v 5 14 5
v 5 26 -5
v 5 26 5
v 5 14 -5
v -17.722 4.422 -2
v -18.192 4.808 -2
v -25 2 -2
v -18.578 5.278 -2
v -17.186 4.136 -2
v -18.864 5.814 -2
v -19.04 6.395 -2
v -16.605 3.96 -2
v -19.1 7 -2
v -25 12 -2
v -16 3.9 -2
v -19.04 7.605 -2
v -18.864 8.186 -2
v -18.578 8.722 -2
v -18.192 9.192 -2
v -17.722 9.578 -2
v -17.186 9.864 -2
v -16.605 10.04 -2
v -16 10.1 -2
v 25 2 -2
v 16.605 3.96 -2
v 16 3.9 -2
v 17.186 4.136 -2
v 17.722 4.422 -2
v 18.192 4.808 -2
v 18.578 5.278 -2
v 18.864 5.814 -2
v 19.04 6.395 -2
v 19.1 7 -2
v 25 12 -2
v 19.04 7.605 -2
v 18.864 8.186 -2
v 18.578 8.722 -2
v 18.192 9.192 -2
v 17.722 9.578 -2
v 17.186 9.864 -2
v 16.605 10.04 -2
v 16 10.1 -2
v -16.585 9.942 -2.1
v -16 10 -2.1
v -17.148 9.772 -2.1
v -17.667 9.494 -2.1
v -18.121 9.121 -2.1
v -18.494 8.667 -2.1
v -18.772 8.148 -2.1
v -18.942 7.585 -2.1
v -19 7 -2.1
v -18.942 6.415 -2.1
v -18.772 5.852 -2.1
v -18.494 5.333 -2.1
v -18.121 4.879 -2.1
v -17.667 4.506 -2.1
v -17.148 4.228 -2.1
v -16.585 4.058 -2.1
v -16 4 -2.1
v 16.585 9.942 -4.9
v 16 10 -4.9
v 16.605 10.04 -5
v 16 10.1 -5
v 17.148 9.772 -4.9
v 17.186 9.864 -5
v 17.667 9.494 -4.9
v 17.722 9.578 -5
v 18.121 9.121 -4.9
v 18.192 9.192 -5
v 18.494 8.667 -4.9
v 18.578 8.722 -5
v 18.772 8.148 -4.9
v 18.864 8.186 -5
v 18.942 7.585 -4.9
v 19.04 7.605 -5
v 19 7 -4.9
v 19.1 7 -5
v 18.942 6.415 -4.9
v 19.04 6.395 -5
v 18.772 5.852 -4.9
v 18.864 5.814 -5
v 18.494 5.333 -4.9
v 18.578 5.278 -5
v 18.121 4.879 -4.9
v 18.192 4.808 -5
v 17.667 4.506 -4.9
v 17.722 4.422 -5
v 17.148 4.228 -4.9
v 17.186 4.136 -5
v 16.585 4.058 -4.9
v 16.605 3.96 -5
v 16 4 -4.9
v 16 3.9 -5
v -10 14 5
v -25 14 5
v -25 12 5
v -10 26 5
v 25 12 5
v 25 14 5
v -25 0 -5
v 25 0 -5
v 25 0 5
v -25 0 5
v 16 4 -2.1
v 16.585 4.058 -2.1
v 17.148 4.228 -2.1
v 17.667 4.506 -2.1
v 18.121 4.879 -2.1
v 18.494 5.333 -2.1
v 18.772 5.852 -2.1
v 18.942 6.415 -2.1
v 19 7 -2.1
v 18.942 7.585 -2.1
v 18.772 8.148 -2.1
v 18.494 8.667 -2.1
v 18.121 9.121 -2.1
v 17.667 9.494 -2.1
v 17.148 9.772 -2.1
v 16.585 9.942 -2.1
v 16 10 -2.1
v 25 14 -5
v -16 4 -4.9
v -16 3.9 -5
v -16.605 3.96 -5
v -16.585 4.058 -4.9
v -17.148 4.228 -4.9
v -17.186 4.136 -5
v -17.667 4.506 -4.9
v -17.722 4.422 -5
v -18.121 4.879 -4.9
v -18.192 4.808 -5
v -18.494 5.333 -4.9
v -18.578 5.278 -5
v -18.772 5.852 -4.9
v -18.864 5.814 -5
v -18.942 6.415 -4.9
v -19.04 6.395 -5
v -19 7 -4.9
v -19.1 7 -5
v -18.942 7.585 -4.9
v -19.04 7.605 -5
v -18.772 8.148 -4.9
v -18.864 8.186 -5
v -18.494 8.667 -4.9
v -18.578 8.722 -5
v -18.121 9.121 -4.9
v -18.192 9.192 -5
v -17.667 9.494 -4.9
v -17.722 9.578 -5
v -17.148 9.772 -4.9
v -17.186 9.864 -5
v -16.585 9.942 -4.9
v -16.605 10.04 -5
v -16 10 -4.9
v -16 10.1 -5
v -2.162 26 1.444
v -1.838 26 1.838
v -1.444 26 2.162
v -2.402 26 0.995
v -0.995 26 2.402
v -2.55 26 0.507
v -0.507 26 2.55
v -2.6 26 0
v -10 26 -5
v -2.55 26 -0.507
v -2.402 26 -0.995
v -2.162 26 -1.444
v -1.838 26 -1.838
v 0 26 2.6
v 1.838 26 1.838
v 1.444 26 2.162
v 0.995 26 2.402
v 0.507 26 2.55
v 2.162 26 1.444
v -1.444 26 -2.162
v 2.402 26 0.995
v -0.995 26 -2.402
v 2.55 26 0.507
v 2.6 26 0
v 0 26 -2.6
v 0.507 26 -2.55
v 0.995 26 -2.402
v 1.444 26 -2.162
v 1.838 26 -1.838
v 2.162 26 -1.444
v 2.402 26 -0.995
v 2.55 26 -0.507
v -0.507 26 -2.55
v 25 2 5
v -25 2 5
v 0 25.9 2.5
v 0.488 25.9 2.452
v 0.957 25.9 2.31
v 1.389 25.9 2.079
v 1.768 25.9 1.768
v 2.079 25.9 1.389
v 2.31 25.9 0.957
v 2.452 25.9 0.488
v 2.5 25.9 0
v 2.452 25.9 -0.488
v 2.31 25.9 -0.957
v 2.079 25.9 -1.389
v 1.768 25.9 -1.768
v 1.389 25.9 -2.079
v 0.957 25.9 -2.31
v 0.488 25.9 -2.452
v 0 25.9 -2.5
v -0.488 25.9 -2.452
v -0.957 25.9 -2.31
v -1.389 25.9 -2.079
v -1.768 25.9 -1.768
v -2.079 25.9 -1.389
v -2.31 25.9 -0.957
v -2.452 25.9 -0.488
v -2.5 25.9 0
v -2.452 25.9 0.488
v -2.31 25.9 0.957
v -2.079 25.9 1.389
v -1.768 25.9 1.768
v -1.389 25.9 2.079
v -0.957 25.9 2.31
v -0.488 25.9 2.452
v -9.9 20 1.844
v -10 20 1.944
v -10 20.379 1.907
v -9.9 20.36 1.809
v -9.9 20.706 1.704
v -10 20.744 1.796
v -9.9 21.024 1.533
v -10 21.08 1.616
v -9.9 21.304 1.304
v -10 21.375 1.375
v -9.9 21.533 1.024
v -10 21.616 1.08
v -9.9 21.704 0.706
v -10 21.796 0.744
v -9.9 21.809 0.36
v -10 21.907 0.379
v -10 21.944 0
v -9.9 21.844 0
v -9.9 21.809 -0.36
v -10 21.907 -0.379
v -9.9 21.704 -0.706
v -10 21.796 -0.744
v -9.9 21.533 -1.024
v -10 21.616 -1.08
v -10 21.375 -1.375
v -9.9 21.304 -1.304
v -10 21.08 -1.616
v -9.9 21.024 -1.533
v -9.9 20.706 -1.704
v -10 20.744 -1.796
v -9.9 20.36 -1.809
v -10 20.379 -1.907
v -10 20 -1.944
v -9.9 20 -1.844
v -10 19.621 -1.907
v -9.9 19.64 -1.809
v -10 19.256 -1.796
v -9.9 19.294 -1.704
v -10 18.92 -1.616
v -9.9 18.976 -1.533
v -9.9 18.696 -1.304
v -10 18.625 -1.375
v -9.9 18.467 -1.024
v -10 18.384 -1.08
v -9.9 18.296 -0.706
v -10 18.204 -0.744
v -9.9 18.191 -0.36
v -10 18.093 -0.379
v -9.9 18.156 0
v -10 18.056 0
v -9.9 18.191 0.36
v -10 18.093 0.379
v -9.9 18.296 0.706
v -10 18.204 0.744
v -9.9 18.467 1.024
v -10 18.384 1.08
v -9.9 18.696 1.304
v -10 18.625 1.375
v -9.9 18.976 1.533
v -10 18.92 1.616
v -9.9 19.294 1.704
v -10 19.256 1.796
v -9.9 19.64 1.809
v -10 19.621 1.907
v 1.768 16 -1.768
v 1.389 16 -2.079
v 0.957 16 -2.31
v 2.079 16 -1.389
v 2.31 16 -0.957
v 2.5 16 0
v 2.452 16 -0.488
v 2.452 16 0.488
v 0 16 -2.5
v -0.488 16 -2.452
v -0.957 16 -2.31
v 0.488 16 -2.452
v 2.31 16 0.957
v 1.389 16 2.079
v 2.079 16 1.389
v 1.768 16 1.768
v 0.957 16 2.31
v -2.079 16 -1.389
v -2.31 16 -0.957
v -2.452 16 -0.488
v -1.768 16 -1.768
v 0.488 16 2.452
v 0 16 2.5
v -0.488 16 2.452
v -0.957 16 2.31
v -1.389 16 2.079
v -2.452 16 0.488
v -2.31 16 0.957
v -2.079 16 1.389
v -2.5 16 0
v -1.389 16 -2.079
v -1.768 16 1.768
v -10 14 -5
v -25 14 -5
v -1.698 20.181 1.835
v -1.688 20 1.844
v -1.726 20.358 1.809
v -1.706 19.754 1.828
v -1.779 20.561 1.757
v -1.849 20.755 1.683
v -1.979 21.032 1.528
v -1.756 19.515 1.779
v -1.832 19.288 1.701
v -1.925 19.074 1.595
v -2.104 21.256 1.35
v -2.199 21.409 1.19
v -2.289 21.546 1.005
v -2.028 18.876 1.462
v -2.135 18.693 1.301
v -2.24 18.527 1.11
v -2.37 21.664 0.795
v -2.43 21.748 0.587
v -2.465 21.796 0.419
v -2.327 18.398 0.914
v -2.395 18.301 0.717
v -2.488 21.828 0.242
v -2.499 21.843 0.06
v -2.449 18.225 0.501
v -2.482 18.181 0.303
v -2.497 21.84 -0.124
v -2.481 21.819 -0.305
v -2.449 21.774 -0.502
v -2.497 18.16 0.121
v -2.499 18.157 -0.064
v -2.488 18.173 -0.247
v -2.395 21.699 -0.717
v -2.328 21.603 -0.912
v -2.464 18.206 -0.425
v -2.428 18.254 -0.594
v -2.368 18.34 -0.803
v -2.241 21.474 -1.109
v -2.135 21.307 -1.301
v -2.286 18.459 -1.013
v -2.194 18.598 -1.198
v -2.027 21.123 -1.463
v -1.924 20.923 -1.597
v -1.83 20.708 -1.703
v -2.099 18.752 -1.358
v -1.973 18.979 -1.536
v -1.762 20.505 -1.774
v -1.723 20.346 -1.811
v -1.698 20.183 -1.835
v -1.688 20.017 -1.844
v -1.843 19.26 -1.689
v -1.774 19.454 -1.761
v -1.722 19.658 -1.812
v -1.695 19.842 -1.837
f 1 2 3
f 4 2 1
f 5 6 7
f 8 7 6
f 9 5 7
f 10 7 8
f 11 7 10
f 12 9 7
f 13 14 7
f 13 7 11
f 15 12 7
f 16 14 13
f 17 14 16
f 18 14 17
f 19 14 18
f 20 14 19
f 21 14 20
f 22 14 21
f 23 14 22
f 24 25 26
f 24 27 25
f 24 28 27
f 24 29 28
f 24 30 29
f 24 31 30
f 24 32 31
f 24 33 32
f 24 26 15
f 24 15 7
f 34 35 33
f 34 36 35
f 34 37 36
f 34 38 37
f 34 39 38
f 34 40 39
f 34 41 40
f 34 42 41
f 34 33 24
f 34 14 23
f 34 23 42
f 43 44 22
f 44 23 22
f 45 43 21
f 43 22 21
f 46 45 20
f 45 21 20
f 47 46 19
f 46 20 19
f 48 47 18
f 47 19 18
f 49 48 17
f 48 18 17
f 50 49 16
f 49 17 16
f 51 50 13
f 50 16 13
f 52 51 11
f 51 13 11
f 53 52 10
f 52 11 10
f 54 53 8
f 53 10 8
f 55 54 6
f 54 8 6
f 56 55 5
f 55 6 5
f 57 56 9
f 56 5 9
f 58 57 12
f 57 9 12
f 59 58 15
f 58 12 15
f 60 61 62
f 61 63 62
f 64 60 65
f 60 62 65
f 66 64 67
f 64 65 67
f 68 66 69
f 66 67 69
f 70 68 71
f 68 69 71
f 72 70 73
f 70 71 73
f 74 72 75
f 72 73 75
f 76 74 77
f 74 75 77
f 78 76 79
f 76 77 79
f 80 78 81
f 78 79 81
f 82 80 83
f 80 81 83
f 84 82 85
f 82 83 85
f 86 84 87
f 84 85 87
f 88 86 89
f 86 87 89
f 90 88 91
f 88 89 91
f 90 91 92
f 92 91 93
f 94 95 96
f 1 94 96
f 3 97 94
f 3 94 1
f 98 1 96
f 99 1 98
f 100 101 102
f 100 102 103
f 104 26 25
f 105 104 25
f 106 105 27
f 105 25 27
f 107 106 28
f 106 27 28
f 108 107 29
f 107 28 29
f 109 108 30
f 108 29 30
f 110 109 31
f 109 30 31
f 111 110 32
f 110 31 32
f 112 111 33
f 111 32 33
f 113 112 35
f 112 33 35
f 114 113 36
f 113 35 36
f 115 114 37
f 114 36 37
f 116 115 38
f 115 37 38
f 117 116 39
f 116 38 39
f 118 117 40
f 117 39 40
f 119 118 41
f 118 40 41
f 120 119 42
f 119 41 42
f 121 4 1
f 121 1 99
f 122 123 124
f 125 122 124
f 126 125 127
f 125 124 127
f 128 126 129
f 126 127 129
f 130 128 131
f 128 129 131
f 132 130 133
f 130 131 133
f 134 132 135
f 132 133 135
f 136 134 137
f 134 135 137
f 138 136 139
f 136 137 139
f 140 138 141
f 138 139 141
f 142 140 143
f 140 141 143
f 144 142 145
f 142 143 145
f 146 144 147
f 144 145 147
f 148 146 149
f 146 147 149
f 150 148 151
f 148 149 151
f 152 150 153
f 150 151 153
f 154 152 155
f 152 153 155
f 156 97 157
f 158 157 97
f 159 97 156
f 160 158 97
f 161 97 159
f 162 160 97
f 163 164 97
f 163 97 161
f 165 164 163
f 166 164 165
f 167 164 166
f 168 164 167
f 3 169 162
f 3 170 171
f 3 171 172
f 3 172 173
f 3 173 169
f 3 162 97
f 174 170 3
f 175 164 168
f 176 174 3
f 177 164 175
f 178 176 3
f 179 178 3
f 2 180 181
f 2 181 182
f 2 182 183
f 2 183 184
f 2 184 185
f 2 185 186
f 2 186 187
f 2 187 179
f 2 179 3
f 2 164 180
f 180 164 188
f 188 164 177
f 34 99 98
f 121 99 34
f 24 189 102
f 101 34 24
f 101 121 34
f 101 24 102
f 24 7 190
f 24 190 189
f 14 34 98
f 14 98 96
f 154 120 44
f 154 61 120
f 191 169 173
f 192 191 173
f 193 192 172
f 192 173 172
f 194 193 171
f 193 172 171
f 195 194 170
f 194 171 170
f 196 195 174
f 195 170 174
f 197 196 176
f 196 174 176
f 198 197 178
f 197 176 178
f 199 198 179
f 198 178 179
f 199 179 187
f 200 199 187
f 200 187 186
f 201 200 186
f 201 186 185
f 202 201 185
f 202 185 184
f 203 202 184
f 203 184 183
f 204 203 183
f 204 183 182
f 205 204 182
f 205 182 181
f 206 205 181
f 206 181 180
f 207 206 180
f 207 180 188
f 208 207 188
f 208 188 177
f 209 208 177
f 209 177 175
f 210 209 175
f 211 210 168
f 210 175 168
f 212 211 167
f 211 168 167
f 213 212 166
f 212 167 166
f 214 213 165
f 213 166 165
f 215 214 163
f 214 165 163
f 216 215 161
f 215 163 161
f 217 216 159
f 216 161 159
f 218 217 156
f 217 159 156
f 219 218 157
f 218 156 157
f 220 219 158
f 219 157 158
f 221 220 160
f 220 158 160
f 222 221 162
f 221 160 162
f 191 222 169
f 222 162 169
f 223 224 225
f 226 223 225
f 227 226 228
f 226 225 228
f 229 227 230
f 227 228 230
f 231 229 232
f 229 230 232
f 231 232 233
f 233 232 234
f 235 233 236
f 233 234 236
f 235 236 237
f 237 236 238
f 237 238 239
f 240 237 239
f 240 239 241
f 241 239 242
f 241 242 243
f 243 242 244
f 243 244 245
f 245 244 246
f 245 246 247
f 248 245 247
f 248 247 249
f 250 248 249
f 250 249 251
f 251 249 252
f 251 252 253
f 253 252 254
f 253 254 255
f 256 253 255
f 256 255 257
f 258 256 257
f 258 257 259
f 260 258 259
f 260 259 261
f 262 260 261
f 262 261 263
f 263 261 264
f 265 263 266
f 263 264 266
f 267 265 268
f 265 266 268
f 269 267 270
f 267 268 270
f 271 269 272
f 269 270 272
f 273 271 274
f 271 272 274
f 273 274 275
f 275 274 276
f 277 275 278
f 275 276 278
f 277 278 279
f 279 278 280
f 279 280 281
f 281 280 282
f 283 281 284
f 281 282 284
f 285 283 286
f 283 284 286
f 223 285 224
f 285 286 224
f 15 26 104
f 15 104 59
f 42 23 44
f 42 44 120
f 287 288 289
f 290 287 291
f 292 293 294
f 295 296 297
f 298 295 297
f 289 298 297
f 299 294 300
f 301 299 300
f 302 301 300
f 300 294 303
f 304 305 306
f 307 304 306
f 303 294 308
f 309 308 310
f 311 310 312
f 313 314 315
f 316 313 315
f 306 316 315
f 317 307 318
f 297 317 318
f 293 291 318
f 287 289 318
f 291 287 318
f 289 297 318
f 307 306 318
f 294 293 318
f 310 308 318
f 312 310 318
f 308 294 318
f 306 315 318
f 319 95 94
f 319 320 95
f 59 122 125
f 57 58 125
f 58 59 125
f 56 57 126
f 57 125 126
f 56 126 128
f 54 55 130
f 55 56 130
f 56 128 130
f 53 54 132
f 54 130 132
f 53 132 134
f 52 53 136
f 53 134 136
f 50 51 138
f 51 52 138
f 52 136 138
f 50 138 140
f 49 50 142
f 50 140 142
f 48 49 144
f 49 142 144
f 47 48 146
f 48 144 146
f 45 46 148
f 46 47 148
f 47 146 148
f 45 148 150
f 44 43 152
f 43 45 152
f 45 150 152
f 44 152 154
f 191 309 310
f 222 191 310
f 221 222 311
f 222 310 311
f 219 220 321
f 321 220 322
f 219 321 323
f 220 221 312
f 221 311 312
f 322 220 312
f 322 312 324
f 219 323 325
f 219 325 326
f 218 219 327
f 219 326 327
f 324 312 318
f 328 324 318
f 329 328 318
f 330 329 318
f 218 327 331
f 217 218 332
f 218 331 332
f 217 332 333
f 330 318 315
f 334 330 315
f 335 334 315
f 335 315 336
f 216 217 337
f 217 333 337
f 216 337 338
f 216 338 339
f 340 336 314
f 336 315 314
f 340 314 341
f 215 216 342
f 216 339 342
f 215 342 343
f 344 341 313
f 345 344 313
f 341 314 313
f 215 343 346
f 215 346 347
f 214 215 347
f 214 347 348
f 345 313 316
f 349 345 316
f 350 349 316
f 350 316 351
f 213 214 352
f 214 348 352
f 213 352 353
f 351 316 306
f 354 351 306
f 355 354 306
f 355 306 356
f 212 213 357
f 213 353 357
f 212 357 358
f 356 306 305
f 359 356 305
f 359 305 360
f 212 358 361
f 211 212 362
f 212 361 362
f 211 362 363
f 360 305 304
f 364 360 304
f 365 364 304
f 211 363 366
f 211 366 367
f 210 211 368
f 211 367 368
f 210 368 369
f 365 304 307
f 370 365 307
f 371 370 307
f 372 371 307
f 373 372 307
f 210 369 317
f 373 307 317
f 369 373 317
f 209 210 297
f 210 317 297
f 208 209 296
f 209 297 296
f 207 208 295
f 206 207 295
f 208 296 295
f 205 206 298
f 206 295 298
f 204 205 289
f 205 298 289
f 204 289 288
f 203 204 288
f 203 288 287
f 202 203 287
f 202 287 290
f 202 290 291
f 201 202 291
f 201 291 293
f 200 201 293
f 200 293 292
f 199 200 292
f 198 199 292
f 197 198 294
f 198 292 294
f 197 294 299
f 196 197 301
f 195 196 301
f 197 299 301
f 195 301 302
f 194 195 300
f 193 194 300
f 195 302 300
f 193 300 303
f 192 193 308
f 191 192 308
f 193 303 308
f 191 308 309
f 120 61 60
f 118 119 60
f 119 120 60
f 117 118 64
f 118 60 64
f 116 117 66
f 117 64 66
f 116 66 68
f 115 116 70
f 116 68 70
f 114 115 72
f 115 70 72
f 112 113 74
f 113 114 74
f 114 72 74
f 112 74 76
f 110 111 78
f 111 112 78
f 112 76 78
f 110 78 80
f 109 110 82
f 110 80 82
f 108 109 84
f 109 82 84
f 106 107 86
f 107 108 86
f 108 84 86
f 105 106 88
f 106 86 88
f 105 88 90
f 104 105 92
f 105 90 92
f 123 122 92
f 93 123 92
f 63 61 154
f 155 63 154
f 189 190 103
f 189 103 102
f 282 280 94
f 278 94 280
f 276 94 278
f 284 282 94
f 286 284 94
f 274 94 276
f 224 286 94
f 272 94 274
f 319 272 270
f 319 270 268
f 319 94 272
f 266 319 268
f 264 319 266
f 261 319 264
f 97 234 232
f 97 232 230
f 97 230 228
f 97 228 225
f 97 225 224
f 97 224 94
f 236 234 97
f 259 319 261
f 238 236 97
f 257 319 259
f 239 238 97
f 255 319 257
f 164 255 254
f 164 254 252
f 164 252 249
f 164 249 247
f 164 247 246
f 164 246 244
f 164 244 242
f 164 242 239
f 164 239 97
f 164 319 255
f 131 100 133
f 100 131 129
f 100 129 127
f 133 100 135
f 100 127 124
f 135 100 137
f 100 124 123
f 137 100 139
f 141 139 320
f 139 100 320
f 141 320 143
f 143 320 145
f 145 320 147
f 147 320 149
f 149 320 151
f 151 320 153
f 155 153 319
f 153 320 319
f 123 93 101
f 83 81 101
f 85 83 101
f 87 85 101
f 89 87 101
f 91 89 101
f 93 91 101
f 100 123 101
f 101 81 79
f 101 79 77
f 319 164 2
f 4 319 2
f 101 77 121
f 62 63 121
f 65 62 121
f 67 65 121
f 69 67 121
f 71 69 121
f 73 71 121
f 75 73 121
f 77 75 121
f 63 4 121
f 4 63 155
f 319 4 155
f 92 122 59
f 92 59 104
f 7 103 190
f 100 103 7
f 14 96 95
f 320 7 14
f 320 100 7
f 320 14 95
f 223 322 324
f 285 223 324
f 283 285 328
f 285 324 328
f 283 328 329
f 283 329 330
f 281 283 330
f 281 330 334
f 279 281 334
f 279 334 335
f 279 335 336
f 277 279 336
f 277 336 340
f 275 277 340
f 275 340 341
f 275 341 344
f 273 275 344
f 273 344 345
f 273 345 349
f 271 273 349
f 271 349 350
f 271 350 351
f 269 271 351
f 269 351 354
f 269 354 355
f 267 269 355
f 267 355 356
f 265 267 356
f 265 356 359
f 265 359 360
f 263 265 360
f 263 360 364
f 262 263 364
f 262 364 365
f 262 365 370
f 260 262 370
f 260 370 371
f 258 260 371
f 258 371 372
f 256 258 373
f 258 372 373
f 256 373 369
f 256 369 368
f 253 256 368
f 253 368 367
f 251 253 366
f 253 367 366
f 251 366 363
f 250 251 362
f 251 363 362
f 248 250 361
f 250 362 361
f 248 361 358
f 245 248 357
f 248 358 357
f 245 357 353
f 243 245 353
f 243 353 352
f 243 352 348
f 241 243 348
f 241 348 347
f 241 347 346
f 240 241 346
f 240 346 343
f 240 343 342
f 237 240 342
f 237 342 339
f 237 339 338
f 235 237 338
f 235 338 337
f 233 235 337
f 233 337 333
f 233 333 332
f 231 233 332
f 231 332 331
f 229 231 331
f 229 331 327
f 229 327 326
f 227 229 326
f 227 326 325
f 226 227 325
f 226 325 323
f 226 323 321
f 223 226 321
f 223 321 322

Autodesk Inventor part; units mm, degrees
ref_plane "YZ Plane" through (0, 0, 0) normal (1, 0, 0) x (0, 1, 0)
ref_plane "XZ Plane" through (0, 0, 0) normal (0, 1, 0) x (-1, 0, 0)
ref_plane "XY Plane" through (0, 0, 0) normal (0, 0, 1) x (1, 0, 0)
sketch "Sketch1" plane through (0, 0, 0) normal (0, 0, 1) x (1, 0, 0)
  line L0 (-25, 14) -> (-10, 14)
  line L1 (-10, 14) -> (-10, 26)
  line L2 (-10, 26) -> (5, 26)
  line L3 (5, 26) -> (5, 14)
  line L4 (5, 14) -> (25, 14)
  line L5 (25, 14) -> (25, 0)
  line L6 (25, 0) -> (-25, 0)
  line L7 (-25, 0) -> (-25, 14)
  line L8 (-16, 7) -> (16, 7) construction
  line L9 (-16, 4) -> (16, 4)
  line L10 (16, 10) -> (-16, 10)
  arc A0 (-16, 10) -> (-16, 4) centre (-16, 7) ccw
  arc A1 (16, 4) -> (16, 10) centre (16, 7) ccw
  line L11 (25, 12) -> (-25, 12)
  line L12 (-25, 2) -> (25, 2)
  point P0 (0, 0)
  point P1 (0, 0)
  point P2 (0, 7)
  point P3 (0, 26)
  point P4 (-10, 20)
  dimension "d0" = 26
  dimension "d1" = 14
  dimension "d2" = 50
  dimension "d3" = 15
  dimension "d4" = 15
  dimension "d7" = 32
  dimension "d8" = 6
  dimension "d9" = 10
extrude "Extrusion1" add sketch "Sketch1" along normal mid plane 10 contours L0 L1 L2 L3 L4 L5 L11 L7 | L11 L5 L12 L7 | L12 L5 L6 L7 | A0 L10 A1 L9
extrude "Extrusion2" cut sketch "Sketch1" along normal blind 5 and the other way blind 2 contours L11 L5 L12 L7
extrude "Extrusion3" cut sketch "Sketch1" along normal through all both and the other way through all contours A0 L10 A1 L9
hole "Hole1" at (0, 26, 0) direction (0, -1, 0) diameter 5 depth 10
hole "Hole2" at (-10, 20, 0) direction (1, 0, 0) diameter 3.6881 end up to surface thread size "M4.5x0.75" class "6H" standard "ISO Metric profile"
chamfer "Chamfer1" distance 0.1 angle 45 10 edges at (-10, 20, -1.8441) (0, 26, -2.5) (0, 4, -2) (19, 7, -2) (0, 10, -2) (-19, 7, -2) (0, 4, -5) (19, 7, -5) (0, 10, -5) (-19, 7, -5)
properties part number "Crosshead"
